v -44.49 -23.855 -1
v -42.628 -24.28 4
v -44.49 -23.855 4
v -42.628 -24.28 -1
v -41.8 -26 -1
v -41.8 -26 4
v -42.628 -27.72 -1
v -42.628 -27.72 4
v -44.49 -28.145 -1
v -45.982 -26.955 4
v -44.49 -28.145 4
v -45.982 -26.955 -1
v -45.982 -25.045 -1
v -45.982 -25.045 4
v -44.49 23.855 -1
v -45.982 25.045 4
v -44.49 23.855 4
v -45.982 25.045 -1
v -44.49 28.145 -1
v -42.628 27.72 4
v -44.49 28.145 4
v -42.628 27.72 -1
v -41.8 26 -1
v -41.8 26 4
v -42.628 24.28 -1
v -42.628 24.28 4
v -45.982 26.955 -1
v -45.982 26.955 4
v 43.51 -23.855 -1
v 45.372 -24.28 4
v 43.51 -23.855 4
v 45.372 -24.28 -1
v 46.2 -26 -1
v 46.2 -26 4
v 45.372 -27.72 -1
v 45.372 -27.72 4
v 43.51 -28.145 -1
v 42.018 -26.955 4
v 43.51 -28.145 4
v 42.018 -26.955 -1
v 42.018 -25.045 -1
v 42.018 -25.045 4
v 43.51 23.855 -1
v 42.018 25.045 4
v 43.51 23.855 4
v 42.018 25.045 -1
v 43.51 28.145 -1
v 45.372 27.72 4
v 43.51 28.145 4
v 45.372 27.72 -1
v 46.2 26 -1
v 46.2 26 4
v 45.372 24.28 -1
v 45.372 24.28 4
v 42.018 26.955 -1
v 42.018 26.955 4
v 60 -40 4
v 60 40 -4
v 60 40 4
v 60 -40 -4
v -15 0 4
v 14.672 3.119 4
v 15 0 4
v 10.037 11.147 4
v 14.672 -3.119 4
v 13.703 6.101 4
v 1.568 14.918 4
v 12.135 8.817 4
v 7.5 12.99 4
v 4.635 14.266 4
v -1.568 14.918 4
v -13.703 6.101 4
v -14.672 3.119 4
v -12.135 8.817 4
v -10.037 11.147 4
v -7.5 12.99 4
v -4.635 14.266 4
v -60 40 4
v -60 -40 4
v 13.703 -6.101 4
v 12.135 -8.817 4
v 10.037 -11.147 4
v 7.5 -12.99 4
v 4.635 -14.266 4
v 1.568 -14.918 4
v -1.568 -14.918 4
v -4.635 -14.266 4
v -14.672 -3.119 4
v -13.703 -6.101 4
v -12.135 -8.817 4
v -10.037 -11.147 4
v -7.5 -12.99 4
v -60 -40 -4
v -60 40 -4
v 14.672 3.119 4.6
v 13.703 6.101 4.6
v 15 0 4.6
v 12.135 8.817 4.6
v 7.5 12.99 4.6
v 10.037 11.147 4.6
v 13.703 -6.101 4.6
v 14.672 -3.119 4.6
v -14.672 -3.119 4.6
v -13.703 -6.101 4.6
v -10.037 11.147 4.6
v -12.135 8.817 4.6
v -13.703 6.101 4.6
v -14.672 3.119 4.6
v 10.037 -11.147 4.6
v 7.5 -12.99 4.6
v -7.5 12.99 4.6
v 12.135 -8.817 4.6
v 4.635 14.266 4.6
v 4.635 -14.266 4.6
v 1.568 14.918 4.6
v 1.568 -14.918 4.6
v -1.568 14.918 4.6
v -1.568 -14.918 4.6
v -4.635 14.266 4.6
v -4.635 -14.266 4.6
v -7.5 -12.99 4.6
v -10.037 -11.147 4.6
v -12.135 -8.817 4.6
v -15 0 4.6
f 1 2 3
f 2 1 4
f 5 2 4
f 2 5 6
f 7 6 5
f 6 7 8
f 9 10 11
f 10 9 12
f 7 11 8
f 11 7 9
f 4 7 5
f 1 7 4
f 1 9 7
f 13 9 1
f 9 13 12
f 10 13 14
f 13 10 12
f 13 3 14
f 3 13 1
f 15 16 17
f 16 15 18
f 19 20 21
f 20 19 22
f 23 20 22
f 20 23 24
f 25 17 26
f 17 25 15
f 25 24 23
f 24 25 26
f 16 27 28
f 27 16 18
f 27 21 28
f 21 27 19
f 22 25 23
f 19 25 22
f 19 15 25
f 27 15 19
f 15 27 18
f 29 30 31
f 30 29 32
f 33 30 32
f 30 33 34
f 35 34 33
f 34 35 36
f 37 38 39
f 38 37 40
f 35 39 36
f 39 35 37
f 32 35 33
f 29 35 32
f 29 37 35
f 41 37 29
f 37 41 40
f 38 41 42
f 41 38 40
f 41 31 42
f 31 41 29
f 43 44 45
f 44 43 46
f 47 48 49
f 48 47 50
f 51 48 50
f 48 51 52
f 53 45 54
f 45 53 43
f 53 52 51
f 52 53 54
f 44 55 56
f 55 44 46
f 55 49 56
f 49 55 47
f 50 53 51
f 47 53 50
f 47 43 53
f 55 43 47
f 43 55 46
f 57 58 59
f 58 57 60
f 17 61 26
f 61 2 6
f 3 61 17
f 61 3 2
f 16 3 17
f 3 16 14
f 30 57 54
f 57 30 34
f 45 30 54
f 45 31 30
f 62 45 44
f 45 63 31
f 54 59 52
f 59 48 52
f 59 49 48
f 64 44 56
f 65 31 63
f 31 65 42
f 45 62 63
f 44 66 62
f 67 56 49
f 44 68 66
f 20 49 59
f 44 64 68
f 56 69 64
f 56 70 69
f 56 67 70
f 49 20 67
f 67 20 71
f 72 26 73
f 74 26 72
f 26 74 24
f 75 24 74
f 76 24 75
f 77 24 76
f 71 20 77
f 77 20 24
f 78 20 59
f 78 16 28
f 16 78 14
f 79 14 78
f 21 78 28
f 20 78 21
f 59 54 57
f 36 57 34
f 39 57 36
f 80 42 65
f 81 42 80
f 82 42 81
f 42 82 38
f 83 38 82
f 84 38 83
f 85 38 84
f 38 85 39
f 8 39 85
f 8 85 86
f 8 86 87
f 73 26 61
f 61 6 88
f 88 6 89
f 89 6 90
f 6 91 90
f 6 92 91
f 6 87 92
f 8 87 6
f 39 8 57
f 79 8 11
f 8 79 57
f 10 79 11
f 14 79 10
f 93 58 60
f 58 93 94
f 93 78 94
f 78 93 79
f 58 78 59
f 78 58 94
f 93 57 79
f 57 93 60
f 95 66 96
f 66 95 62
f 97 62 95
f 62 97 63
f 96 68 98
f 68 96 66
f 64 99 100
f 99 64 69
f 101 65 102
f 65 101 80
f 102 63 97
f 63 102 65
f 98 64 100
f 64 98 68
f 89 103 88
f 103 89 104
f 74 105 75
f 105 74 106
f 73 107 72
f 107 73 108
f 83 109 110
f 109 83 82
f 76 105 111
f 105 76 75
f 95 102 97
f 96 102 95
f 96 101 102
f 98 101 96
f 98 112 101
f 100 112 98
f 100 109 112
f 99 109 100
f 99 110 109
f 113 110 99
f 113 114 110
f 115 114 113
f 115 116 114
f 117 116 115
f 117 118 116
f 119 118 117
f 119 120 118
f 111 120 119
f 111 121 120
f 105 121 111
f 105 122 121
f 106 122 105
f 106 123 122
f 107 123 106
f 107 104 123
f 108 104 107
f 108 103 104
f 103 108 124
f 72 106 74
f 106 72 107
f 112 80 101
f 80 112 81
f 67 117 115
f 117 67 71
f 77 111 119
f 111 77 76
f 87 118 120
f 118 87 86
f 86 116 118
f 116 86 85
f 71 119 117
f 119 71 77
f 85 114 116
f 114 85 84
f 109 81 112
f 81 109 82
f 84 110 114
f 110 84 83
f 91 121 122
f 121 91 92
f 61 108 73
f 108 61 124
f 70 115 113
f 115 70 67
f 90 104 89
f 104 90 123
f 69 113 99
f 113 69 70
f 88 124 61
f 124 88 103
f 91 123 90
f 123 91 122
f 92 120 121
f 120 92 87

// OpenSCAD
// 独立摆锤台架 —— Part 1: 底座板 base_plate.scad
// 材质建议: 铝板 8mm / 亚克力 8mm / PETG 打印(壁厚≥4层)
// 用法: 把参数改好后, openscad 打开 → Render → Export STL 打印;
//       或按尺寸表直接手绘铝板打孔(全部用标准钻头/沉头)。
// 单位: mm

base_len  = 120;   // 长(X)
base_wid  = 80;    // 宽(Y)
base_t    = 8;     // 厚
hole_d    = 4.4;   // M4 通孔(沉头 M4 用 8mm)
hole_sp_x = 88;    // 孔距 X
hole_sp_y = 52;    // 孔距 Y

difference() {
    cube([base_len, base_wid, base_t], center=true);
    for (sx = [-1, 1]) for (sy = [-1, 1])
        translate([sx * hole_sp_x / 2, sy * hole_sp_y / 2, base_t / 2])
            cylinder(h = base_t + 2, d = hole_d, center = true);
}
// 顶部贴合标记(可选, 便于对中, 不打印也行)
translate([0, 0, base_t/2]) cylinder(h = 0.6, d = 30);
